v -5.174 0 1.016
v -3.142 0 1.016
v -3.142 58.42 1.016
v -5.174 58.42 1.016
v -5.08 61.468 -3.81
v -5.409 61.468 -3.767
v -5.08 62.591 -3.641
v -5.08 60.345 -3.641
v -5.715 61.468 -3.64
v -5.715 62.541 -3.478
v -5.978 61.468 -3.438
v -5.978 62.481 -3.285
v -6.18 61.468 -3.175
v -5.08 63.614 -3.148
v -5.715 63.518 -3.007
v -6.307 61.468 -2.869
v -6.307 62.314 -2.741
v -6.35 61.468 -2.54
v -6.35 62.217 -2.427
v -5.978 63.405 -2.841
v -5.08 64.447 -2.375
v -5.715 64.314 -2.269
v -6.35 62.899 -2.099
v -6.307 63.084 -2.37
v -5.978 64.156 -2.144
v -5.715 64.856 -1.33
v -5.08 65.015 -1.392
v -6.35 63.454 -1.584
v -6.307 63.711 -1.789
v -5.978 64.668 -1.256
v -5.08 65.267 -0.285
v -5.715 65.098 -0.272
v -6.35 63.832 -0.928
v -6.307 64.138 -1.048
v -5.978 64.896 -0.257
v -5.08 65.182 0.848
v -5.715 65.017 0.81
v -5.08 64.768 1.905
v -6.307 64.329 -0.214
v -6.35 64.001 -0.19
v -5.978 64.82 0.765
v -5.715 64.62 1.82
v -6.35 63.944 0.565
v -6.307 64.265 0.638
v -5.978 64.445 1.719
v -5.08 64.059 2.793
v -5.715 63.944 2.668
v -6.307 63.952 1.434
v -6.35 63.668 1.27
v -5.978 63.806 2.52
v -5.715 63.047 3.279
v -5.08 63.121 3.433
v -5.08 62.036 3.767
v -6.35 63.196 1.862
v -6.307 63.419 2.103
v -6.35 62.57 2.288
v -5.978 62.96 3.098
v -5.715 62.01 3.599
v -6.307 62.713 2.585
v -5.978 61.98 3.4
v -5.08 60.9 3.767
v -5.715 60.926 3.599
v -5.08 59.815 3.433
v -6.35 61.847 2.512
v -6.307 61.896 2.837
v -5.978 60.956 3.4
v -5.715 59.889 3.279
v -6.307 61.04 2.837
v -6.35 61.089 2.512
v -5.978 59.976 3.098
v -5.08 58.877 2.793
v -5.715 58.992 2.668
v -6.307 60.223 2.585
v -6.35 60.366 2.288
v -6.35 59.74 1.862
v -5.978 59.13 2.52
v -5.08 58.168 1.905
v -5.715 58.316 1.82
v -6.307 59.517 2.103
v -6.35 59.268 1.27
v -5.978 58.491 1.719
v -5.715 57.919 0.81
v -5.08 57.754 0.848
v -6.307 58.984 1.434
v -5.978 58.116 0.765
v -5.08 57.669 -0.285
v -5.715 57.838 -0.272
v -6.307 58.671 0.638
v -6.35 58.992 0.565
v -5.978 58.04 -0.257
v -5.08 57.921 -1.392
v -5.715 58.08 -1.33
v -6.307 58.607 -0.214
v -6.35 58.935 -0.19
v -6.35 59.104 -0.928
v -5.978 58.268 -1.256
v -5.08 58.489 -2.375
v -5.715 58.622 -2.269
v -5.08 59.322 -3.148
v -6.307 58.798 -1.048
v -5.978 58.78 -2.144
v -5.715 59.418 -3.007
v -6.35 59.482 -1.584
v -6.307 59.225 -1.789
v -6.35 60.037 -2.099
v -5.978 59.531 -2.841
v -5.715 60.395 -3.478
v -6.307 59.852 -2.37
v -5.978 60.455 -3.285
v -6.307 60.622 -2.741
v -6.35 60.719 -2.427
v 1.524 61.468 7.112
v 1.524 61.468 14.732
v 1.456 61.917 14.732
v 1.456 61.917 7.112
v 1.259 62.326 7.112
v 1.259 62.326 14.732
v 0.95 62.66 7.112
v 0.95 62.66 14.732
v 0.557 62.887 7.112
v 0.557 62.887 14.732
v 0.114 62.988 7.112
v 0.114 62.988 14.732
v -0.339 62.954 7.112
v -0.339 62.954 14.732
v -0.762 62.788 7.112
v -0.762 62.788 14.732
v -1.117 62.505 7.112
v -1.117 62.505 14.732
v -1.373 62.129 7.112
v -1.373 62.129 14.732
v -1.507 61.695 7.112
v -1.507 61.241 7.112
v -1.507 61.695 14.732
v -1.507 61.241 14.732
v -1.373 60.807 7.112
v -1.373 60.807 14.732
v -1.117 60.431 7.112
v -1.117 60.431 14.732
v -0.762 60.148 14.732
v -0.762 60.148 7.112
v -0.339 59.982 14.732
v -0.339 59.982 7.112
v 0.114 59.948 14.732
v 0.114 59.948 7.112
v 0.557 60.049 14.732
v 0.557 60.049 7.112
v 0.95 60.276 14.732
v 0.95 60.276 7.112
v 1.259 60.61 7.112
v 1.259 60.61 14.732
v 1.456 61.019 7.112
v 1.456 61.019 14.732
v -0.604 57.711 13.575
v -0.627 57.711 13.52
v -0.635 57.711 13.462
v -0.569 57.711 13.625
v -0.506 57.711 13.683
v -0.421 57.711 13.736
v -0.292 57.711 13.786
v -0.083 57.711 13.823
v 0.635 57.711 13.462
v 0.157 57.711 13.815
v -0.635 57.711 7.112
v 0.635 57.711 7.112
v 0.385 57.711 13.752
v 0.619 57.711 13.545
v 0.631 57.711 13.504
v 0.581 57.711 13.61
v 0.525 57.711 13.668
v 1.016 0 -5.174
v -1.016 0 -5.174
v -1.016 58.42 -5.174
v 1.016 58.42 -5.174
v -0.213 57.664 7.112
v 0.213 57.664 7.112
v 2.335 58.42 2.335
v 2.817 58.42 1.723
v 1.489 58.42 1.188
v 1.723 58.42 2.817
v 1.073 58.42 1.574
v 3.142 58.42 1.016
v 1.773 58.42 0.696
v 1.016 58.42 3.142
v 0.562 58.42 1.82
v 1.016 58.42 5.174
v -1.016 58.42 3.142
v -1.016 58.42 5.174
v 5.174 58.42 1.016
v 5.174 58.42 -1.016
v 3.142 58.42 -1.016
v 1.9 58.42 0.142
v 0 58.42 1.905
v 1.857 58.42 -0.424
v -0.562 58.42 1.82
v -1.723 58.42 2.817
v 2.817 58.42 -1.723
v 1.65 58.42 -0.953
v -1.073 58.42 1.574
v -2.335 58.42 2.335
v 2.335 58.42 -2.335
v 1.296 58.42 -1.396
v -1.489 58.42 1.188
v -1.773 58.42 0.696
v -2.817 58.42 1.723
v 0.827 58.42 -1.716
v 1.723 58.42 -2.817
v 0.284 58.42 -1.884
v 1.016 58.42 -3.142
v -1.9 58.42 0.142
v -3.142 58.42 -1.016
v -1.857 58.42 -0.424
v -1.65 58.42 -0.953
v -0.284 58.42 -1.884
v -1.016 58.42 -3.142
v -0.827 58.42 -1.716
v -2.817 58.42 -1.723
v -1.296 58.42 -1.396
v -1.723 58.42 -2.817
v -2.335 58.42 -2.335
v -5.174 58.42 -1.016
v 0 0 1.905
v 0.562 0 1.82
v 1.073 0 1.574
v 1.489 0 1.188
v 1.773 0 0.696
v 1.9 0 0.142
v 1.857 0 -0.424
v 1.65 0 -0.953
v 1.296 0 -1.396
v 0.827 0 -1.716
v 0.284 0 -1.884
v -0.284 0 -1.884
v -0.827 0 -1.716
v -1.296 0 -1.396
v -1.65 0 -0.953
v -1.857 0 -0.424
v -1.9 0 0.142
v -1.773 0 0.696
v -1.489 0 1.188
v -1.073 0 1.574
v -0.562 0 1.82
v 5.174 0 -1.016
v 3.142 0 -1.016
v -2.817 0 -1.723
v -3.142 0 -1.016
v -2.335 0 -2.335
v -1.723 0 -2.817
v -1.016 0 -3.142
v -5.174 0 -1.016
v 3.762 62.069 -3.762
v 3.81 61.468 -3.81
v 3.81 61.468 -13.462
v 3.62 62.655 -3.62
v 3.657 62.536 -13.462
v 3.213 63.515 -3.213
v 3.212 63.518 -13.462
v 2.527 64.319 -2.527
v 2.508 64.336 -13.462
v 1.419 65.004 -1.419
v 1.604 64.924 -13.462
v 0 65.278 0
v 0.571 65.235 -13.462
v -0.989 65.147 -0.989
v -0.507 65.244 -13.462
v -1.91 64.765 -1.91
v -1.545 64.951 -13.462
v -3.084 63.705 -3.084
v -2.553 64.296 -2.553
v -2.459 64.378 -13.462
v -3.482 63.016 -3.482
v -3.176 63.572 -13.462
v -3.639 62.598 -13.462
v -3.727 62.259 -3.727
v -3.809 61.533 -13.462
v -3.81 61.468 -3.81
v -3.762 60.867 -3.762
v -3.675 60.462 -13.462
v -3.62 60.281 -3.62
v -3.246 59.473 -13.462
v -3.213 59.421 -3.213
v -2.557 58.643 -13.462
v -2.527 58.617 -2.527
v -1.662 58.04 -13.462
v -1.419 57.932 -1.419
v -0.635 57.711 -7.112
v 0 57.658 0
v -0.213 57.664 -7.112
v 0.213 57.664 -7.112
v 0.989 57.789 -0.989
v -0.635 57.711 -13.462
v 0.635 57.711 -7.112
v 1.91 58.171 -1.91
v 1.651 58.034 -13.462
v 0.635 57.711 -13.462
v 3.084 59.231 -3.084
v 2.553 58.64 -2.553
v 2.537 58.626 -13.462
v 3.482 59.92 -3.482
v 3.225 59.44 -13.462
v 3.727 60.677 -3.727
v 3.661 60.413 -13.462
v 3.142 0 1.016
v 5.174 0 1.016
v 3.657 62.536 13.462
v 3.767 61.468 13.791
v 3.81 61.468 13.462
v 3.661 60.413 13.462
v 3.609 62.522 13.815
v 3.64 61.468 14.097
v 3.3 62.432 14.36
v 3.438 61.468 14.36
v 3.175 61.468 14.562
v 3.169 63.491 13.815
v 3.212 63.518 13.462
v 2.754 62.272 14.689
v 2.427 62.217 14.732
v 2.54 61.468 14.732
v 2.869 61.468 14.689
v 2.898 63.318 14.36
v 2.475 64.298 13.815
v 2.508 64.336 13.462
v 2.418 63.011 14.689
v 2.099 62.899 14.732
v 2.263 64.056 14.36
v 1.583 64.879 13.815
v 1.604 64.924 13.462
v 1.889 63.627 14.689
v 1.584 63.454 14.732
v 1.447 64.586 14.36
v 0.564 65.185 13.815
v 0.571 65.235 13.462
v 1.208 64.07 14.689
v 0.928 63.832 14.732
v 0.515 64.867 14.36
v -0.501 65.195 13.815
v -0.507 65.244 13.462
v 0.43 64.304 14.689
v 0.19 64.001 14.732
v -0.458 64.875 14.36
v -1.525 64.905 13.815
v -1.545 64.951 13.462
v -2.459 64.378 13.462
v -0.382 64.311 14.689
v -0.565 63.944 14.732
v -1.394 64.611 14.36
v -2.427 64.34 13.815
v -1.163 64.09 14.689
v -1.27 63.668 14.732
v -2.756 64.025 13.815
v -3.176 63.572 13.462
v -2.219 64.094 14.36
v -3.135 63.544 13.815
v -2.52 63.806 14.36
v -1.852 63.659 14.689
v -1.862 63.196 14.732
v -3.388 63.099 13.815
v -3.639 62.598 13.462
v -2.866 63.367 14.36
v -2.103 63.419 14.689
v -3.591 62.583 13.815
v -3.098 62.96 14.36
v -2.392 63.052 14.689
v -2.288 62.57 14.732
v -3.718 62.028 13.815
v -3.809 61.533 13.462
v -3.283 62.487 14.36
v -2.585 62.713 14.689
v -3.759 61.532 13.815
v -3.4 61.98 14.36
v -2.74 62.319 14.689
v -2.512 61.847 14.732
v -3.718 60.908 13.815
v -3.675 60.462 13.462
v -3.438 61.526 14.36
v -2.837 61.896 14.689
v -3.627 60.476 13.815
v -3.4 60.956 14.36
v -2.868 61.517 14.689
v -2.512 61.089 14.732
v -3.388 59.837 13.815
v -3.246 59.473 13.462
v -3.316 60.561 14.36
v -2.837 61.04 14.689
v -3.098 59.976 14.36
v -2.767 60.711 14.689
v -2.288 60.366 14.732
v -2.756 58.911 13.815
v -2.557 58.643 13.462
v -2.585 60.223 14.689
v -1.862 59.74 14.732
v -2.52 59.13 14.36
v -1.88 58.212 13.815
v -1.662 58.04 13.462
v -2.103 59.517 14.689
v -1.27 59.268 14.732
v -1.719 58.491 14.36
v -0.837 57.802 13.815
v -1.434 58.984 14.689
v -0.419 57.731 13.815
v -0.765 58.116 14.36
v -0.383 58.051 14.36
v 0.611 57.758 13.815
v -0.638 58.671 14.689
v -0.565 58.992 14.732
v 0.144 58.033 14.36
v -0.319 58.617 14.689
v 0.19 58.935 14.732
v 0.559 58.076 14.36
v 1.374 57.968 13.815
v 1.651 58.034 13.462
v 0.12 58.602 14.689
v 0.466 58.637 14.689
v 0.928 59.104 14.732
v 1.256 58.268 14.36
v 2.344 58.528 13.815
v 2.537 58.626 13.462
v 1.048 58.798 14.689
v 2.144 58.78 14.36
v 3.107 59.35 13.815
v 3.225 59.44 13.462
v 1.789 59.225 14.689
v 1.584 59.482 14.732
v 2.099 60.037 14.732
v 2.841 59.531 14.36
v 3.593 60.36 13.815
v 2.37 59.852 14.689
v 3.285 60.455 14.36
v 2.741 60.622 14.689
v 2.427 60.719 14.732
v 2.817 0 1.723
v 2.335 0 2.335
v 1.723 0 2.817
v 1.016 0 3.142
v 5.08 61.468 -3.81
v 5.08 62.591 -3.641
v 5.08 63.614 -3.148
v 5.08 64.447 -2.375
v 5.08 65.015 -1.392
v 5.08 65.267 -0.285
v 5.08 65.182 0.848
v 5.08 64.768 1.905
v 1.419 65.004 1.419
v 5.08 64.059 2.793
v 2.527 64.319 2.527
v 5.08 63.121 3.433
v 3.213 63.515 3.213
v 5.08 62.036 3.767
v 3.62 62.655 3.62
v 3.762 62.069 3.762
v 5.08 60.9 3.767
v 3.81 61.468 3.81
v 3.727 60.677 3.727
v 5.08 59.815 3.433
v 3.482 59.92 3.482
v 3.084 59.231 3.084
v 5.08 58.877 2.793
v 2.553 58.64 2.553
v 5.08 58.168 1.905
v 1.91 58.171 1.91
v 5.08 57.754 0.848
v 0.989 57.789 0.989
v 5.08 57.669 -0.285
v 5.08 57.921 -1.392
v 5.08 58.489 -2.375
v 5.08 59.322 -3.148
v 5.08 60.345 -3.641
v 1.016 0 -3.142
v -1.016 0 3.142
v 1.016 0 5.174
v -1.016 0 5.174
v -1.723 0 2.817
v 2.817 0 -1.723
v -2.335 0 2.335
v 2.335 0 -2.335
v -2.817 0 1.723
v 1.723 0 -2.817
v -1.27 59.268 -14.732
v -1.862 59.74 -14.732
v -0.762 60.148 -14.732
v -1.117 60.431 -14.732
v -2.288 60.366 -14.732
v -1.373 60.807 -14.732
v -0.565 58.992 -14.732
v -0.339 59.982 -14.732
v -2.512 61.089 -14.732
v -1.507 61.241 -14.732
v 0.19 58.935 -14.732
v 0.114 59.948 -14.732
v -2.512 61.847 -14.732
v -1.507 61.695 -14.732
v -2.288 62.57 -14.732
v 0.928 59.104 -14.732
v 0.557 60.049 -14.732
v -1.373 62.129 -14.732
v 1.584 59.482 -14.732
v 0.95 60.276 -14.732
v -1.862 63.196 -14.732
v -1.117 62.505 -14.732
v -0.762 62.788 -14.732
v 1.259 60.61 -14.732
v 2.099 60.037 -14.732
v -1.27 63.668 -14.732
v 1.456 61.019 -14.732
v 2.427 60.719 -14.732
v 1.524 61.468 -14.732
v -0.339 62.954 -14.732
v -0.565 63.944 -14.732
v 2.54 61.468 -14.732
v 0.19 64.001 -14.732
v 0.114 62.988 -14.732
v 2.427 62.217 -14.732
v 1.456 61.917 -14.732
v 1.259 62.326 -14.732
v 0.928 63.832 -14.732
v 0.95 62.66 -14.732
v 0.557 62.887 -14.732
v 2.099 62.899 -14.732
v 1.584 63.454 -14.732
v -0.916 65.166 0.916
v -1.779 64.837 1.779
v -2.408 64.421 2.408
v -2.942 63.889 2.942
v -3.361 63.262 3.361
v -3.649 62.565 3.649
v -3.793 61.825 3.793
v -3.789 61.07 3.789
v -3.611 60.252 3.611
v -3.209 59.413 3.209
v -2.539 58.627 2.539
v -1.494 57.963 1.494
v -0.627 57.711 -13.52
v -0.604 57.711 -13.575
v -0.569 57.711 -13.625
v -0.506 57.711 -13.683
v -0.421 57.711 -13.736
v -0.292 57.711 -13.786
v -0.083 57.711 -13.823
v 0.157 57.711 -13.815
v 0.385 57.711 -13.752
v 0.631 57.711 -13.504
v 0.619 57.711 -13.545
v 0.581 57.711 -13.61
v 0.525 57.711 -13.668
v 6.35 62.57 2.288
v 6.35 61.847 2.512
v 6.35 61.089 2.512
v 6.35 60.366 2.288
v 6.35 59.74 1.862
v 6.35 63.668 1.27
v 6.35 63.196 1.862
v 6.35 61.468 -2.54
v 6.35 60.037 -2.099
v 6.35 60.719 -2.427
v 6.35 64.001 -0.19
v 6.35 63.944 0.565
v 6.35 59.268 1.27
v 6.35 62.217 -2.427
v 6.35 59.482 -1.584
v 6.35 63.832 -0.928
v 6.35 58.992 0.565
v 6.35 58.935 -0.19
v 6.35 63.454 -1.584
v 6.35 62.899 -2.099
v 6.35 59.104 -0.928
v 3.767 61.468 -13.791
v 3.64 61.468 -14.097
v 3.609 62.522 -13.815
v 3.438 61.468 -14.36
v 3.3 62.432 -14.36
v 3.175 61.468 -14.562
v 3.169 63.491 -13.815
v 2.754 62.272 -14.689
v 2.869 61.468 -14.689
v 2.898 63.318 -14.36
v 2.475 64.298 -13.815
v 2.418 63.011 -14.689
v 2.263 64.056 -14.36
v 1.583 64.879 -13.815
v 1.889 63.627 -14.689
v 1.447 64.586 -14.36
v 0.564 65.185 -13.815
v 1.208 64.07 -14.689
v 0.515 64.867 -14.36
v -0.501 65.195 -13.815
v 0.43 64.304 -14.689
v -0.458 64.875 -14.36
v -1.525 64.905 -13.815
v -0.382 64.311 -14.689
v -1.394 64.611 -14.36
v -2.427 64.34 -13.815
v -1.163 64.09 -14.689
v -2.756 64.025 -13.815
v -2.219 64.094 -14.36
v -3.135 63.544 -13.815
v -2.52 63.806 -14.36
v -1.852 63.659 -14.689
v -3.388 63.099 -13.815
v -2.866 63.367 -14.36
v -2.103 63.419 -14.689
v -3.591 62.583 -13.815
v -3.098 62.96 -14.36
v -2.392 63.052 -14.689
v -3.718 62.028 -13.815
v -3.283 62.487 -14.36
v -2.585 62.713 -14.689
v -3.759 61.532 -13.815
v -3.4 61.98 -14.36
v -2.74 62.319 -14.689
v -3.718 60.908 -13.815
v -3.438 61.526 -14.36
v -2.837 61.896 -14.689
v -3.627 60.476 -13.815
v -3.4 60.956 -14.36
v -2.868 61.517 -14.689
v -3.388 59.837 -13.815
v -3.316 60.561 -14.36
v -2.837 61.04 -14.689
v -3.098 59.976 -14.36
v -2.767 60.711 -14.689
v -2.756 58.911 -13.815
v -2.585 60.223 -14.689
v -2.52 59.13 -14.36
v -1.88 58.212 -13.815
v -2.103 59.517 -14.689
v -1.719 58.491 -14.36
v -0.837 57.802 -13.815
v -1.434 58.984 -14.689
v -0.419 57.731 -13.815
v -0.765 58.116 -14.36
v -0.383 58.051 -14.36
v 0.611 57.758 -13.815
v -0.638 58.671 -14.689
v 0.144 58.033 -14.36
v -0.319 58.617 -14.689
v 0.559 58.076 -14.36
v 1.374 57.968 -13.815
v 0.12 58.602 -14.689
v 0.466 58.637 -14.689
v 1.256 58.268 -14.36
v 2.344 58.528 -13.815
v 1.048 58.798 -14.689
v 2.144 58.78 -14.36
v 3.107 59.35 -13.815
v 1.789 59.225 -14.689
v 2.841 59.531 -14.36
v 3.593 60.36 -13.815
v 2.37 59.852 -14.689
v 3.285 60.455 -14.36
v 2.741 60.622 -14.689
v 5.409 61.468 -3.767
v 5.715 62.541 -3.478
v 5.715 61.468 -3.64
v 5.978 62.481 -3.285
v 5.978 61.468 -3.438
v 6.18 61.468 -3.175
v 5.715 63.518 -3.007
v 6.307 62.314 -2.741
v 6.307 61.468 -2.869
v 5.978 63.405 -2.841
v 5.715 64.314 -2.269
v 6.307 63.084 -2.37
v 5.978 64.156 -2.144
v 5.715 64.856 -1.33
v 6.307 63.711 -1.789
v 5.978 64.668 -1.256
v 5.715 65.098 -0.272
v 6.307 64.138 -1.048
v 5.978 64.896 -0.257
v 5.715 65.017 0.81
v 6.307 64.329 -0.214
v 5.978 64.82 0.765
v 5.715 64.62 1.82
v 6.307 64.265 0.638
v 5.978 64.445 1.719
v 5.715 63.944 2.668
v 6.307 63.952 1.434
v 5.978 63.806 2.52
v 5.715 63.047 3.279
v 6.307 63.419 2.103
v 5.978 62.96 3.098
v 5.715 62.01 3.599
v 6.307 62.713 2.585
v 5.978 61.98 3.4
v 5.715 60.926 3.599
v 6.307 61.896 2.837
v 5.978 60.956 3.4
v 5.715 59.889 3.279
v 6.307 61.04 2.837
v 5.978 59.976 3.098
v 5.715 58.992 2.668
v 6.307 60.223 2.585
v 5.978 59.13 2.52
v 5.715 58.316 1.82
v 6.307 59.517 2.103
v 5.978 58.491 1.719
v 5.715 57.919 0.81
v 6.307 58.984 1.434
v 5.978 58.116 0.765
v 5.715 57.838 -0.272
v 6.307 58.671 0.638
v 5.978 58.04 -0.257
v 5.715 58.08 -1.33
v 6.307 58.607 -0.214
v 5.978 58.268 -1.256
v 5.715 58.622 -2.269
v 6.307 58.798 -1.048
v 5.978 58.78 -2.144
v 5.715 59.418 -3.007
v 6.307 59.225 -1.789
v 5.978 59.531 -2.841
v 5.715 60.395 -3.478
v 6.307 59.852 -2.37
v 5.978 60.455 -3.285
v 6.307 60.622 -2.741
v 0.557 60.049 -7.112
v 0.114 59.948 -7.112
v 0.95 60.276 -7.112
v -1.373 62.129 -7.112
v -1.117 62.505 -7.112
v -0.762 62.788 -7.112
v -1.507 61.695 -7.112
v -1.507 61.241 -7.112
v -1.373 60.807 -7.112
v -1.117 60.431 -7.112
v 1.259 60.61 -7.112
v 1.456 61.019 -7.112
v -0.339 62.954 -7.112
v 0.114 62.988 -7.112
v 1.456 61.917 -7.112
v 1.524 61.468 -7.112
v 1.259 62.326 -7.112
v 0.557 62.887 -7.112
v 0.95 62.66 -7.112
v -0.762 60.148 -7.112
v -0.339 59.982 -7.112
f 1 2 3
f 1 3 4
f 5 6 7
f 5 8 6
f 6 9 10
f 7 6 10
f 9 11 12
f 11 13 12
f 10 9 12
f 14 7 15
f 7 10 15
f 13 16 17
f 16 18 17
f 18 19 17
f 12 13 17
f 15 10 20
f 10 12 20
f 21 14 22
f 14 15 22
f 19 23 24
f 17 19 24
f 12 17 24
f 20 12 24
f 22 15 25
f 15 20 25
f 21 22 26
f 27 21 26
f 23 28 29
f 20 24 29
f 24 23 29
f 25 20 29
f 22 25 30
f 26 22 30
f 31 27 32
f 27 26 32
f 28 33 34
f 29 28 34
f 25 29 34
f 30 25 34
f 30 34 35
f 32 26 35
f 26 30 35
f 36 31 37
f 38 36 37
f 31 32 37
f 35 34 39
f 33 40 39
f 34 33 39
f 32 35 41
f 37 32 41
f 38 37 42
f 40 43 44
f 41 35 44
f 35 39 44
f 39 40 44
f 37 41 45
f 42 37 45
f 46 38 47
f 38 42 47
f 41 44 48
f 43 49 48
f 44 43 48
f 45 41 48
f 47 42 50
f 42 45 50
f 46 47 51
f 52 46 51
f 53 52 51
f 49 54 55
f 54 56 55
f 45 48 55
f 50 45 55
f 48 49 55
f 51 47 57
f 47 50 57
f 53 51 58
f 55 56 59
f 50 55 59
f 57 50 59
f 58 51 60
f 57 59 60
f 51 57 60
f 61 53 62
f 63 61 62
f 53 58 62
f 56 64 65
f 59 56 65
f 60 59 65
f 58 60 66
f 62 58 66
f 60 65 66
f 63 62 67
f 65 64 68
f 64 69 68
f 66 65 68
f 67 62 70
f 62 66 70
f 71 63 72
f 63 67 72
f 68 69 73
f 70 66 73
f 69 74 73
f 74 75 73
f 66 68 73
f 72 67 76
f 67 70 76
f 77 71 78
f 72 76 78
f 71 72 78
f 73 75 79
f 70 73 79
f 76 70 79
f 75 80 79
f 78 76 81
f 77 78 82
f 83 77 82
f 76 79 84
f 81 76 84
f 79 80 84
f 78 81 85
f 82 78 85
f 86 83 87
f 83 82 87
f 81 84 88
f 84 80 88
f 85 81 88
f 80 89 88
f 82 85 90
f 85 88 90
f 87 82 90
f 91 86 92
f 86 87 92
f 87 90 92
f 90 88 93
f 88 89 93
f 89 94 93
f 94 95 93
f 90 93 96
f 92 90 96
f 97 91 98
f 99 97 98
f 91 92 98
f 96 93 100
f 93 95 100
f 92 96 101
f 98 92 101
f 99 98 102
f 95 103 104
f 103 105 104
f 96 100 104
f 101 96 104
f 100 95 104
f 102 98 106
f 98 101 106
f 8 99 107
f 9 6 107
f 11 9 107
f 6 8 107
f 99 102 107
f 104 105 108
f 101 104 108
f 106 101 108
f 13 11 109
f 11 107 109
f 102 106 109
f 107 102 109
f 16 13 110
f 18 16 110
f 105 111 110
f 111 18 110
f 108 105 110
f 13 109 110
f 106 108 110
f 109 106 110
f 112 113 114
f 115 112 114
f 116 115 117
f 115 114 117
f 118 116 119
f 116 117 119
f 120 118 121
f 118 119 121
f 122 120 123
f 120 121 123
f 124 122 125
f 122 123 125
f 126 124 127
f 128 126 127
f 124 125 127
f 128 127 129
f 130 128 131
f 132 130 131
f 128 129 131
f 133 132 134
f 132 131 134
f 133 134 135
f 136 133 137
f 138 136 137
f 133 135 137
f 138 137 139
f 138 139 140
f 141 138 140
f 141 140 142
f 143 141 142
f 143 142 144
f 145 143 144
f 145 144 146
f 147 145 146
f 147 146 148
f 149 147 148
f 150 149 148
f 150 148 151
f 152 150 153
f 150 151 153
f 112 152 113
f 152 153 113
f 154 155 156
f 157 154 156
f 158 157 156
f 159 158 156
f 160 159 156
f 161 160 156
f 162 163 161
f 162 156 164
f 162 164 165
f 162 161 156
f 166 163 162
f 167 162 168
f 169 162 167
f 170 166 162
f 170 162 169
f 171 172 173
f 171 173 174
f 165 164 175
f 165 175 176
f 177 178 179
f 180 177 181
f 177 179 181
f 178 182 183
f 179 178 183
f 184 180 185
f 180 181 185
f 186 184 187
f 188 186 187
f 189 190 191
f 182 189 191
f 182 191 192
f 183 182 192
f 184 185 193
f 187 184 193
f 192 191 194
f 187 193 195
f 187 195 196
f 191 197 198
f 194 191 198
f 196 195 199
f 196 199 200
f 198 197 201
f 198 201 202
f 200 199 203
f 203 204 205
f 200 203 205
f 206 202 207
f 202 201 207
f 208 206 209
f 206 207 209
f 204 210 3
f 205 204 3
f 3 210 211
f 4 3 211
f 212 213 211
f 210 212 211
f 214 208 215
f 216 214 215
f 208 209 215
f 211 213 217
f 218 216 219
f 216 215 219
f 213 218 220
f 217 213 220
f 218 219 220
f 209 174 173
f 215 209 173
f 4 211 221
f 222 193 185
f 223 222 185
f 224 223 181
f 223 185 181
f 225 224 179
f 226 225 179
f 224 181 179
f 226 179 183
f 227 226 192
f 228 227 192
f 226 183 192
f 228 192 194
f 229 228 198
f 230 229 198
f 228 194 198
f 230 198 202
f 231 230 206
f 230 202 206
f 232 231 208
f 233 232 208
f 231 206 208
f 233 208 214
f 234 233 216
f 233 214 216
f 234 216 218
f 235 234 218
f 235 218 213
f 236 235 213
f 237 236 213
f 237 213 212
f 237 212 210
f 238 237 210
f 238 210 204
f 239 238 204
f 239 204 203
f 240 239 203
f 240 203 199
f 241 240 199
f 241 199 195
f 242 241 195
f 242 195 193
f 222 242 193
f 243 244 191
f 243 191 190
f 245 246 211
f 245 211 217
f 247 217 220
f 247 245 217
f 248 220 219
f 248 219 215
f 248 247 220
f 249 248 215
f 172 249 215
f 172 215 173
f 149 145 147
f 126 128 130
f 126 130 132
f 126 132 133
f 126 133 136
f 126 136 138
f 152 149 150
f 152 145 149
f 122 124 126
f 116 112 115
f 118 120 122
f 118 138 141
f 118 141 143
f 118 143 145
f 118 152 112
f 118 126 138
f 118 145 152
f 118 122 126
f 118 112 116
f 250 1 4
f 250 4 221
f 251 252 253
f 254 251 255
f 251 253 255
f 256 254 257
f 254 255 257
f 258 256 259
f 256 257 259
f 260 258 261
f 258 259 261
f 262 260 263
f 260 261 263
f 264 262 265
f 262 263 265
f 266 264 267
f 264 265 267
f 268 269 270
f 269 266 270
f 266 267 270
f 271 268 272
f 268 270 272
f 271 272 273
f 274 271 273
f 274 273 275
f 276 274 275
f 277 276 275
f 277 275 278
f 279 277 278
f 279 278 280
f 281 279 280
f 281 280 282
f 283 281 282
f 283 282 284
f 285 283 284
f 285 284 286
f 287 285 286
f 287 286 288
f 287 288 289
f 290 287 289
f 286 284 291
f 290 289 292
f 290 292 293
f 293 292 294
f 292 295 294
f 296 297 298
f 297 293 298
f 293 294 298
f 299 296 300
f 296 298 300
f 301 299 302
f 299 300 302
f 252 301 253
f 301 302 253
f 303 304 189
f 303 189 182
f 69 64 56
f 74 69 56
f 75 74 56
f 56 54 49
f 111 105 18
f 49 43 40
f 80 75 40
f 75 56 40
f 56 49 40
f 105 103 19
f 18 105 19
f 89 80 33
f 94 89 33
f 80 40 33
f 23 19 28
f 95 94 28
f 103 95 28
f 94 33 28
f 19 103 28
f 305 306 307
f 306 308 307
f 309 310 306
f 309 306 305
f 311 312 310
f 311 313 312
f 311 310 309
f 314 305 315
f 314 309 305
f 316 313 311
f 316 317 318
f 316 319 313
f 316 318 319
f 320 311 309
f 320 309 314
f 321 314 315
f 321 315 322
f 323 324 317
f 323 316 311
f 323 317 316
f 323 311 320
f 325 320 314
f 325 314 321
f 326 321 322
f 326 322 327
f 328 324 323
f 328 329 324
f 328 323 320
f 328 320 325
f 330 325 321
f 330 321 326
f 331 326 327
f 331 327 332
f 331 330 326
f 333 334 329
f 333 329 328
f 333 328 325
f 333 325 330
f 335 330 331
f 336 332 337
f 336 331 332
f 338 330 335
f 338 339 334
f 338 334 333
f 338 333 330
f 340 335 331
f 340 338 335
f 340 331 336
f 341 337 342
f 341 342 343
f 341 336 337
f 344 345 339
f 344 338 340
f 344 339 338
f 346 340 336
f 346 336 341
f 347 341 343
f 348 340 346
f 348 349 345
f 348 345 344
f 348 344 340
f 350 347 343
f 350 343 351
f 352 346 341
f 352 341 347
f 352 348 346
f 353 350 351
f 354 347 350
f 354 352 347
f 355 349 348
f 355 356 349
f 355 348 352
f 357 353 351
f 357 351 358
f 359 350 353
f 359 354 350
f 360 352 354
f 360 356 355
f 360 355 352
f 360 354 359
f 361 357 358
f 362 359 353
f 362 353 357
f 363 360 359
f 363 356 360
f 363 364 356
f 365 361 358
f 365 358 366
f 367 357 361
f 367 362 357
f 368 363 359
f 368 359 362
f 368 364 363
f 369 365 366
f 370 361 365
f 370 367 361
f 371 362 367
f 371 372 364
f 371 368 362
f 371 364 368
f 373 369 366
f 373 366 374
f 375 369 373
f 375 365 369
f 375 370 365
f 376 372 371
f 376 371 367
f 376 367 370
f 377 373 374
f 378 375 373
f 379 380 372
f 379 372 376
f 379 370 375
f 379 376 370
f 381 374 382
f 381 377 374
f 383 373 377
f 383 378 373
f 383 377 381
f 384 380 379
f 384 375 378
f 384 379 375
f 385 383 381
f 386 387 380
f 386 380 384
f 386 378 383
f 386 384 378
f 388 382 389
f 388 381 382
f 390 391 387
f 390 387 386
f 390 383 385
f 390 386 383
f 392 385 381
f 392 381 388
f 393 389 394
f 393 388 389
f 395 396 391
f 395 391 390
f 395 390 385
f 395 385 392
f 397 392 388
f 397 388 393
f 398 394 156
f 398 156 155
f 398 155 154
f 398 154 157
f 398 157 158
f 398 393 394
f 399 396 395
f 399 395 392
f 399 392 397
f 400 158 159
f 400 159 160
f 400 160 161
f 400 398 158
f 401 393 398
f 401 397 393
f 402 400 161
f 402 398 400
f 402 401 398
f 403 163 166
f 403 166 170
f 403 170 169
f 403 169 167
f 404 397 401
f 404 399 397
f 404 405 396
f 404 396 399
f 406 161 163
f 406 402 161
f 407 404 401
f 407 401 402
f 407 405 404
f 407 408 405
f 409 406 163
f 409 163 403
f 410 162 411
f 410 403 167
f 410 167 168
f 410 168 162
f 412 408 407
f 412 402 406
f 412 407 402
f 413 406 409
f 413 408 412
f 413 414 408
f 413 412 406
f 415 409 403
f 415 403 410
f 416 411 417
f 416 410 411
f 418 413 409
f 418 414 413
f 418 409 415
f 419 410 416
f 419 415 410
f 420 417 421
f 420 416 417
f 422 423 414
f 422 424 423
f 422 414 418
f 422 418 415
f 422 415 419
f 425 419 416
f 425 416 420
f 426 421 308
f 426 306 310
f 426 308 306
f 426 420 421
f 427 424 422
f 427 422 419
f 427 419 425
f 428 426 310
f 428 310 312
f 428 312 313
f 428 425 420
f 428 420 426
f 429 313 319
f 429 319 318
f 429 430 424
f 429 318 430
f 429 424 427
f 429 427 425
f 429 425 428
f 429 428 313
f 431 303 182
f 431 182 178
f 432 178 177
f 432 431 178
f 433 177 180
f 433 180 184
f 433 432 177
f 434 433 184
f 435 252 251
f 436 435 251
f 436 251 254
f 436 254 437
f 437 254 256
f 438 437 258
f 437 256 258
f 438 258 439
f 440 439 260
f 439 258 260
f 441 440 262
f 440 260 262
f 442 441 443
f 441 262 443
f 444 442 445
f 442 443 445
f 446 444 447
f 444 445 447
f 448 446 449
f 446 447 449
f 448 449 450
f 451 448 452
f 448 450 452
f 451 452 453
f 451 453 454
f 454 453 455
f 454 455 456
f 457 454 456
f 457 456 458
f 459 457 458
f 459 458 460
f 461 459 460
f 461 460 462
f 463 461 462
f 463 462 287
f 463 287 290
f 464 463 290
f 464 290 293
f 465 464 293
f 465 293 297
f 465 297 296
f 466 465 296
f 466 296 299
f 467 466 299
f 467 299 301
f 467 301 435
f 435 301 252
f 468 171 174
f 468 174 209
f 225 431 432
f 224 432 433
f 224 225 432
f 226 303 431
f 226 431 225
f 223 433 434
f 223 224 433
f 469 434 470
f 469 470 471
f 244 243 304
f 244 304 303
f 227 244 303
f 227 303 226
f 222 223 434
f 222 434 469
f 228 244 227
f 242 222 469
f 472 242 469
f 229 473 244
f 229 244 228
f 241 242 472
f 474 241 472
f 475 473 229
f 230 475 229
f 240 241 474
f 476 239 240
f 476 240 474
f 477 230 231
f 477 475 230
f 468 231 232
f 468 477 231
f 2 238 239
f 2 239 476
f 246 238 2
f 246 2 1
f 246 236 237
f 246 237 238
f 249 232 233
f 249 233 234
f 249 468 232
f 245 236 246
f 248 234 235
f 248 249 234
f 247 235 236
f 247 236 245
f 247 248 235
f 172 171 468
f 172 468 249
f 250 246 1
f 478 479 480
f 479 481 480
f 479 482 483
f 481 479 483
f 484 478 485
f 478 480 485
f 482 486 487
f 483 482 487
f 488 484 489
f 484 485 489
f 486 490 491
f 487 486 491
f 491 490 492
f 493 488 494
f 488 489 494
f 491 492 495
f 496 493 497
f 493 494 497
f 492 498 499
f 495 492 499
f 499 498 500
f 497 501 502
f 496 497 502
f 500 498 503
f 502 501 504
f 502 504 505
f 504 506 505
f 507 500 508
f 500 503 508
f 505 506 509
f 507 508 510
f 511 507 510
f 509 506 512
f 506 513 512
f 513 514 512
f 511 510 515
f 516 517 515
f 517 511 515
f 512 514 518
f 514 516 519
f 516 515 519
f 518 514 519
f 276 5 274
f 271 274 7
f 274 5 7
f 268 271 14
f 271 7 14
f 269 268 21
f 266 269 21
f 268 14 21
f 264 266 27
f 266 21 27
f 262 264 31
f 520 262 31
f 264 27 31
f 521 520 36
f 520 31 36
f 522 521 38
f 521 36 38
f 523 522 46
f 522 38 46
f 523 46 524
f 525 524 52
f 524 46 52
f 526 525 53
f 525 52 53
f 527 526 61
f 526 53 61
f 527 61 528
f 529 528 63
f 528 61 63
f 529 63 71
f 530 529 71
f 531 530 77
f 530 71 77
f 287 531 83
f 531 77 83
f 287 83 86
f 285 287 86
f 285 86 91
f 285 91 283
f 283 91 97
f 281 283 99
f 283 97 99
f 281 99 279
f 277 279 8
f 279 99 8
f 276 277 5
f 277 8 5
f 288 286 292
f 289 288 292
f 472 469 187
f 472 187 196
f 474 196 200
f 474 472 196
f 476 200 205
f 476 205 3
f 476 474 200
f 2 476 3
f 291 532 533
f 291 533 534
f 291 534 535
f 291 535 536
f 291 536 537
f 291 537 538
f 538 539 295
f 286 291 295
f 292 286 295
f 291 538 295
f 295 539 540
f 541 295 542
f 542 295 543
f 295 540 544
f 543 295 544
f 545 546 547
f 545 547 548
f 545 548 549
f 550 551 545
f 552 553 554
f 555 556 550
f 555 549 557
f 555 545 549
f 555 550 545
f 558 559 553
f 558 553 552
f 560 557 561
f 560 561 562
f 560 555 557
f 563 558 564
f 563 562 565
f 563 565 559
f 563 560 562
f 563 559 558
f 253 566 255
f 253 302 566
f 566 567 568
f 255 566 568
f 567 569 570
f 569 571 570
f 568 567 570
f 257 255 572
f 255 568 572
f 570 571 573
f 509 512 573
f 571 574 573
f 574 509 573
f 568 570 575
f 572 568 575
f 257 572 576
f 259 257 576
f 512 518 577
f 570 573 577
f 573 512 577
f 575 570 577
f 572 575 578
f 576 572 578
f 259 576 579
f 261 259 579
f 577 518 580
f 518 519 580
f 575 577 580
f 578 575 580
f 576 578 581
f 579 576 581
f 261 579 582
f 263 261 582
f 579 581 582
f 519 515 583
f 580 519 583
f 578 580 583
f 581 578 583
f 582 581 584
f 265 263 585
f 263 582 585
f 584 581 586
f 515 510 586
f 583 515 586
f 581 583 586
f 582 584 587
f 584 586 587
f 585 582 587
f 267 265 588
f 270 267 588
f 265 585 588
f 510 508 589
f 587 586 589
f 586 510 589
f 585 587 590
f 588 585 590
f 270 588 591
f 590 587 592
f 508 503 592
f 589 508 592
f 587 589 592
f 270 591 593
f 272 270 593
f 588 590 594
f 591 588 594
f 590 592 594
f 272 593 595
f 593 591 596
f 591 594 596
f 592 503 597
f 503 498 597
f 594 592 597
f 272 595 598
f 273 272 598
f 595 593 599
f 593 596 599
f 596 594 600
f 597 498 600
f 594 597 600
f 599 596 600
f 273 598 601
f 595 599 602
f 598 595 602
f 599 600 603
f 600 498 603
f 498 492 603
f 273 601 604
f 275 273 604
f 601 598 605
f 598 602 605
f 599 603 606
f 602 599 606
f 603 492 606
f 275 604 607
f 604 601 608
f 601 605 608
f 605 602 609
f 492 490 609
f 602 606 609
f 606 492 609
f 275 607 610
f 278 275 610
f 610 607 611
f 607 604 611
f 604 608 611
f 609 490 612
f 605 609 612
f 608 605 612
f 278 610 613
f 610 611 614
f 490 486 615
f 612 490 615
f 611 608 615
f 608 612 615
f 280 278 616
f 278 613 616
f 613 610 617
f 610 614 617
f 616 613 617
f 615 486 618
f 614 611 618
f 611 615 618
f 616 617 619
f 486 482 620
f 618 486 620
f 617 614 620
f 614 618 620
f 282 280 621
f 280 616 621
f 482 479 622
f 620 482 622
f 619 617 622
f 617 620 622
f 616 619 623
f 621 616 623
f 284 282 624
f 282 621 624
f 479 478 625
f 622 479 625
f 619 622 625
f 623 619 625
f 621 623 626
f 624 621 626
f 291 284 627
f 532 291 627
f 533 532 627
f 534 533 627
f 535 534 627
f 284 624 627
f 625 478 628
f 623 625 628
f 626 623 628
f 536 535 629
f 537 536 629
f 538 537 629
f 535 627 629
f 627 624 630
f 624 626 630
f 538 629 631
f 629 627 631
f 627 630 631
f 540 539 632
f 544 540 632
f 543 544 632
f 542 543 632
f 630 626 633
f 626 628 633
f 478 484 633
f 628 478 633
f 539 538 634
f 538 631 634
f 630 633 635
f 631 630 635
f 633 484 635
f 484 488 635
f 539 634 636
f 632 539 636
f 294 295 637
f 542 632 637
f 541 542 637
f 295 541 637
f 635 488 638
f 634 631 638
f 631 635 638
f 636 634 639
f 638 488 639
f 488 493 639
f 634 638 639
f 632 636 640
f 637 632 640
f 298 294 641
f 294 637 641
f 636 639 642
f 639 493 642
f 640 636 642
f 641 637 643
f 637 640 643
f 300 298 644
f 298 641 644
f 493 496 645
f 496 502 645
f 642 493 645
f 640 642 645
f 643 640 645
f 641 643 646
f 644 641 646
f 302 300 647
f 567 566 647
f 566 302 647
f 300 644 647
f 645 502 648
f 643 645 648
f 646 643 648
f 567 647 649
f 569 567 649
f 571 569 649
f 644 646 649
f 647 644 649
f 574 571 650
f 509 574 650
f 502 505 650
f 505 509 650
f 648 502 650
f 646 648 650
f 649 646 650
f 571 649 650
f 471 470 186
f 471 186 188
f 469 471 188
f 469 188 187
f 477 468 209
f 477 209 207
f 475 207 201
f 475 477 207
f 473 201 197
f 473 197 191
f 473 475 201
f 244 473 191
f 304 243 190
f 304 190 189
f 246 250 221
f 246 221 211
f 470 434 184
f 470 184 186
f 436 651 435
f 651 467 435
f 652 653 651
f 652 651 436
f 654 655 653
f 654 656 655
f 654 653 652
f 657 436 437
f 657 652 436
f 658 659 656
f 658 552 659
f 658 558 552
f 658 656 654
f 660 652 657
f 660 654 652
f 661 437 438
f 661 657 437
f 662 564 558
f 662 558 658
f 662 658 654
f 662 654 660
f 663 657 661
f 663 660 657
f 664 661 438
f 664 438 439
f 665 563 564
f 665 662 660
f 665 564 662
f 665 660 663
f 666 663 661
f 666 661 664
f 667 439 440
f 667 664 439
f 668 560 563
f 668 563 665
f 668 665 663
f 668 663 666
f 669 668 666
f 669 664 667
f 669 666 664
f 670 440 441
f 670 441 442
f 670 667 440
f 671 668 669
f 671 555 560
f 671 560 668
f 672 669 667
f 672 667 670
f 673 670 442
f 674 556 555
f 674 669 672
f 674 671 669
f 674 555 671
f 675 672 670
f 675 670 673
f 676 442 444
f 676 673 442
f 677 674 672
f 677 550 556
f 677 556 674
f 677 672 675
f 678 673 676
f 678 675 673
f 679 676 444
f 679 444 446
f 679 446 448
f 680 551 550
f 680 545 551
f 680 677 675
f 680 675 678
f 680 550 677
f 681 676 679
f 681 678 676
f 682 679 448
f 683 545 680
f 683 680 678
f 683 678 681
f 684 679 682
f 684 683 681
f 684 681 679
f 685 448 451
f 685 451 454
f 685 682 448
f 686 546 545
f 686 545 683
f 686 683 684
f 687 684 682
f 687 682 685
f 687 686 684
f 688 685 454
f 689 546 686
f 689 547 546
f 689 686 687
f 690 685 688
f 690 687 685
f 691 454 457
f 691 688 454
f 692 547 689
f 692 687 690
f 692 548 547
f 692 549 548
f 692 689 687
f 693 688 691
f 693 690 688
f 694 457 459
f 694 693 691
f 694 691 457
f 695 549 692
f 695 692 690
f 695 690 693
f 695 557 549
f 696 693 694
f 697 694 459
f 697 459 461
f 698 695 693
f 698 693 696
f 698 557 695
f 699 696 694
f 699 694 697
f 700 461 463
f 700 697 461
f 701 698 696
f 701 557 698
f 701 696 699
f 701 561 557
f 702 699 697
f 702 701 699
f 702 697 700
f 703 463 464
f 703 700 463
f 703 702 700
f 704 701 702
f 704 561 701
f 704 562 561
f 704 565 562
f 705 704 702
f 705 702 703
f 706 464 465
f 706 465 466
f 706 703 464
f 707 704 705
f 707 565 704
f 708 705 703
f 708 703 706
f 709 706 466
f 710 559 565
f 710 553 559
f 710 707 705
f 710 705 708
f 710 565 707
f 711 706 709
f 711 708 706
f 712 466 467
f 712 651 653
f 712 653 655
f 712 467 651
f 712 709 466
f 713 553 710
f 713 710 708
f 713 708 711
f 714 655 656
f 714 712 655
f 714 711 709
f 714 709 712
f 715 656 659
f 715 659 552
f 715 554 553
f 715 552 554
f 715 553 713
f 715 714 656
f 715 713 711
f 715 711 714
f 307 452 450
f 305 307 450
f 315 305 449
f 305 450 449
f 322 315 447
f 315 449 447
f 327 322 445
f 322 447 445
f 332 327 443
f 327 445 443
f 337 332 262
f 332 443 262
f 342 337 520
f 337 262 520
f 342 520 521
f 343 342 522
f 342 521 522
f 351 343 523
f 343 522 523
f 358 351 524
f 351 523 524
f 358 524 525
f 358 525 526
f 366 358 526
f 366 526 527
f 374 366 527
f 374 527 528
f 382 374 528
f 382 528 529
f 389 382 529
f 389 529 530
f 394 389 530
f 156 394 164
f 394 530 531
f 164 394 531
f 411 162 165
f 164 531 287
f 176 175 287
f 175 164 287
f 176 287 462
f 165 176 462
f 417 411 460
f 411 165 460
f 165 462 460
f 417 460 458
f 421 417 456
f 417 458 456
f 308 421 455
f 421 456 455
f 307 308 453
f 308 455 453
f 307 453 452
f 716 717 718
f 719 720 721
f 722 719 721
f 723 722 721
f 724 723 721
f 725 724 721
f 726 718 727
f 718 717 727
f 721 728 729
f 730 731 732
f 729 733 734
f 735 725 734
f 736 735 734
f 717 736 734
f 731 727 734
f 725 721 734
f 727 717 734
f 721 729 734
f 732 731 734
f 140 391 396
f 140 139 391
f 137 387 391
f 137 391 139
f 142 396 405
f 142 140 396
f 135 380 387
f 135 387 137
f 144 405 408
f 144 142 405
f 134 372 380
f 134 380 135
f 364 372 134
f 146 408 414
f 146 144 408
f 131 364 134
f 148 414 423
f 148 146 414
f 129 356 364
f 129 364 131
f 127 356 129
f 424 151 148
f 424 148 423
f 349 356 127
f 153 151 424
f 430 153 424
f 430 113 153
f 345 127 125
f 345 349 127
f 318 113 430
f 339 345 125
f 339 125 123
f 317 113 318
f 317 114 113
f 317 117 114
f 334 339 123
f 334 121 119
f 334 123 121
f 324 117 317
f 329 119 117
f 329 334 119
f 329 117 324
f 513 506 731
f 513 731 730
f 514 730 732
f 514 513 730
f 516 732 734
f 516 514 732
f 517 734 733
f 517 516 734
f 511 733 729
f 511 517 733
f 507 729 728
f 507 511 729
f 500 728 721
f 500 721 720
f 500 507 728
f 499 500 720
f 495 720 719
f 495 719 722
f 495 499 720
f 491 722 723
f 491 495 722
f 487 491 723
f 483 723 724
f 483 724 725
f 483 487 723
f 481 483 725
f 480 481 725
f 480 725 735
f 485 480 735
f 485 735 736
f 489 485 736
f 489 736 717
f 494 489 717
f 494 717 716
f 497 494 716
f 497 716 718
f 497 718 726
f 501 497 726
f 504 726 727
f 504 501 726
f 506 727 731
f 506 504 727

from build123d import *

# Parameters (mm, degrees)
BOSS_EXTRUDE2_DEPTH      = 58.42
SKETCH4_R                = 1.905
CUT_EXTRUDE1_DEPTH       = 59.876420978
BOSS_EXTRUDE3_DEPTH      = 14.732
BOSS_EXTRUDE3_DEPTH_BACK = 14.732
SKETCH5_R                = 3.81
SKETCH6_R                = 3.738220815
CUT_EXTRUDE3_DEPTH       = 12.7
BOSS_EXTRUDE4_DEPTH      = 6.35
BOSS_EXTRUDE4_DEPTH_BACK = 6.35
SKETCH7_R                = 3.81
FILLET2_R                = 1.27
FILLET3_R                = 1.27
FILLET4_R                = 1.27
SKETCH8_R                = 1.524
SKETCH8_W                = 1.27
SKETCH8_H                = 0.341676571
CUT_EXTRUDE4_DEPTH       = 7.62


with BuildPart() as part:
    # Sketch3 → Boss-Extrude2 (new body)
    with BuildSketch(Plane(origin=(0, 0, 0), x_dir=(1, 0, 0), z_dir=(0, 1, 0))):
        with BuildLine():
            Line((-1.016, 3.141806487), (-1.016, 5.173806487))
            Line((-1.016, 5.173806487), (1.016, 5.173806487))
            Line((1.016, 5.173806487), (1.016, 3.141806487))
            ThreePointArc((1.016, 3.141806487), (2.334866591, 2.334866591), (3.141806487, 1.016))
            Line((3.141806487, 1.016), (5.173806487, 1.016))
            Line((5.173806487, 1.016), (5.173806487, -1.016))
            Line((5.173806487, -1.016), (3.141806487, -1.016))
            ThreePointArc((3.141806487, -1.016), (2.334866591, -2.334866591), (1.016, -3.141806487))
            Line((1.016, -3.141806487), (1.016, -5.173806487))
            Line((1.016, -5.173806487), (-1.016, -5.173806487))
            Line((-1.016, -5.173806487), (-1.016, -3.141806487))
            ThreePointArc((-1.016, -3.141806487), (-2.334866591, -2.334866591), (-3.141806487, -1.016))
            Line((-3.141806487, -1.016), (-5.173806487, -1.016))
            Line((-5.173806487, -1.016), (-5.173806487, 1.016))
            Line((-5.173806487, 1.016), (-3.141806487, 1.016))
            ThreePointArc((-3.141806487, 1.016), (-2.334866591, 2.334866591), (-1.016, 3.141806487))
        make_face()
    extrude(amount=BOSS_EXTRUDE2_DEPTH)

    # Sketch4 → Cut-Extrude1 (cut, through all)
    with BuildSketch(Plane(origin=(0, 58.42, 0), x_dir=(1, 0, 0), z_dir=(0, 1, 0))):
        with Locations(Location((0, 0, 0), (0, 0, 270))):
            Circle(SKETCH4_R)
    extrude(amount=-CUT_EXTRUDE1_DEPTH, mode=Mode.SUBTRACT)


with BuildPart() as body_2:
    # Sketch5 → Boss-Extrude3 (new, two sides: drawn at the far end of the back side and taken through both)
    with BuildSketch(Plane.XY.offset(-BOSS_EXTRUDE3_DEPTH_BACK)):
        with Locations((0, 61.468)):
            Circle(SKETCH5_R)
    extrude(amount=BOSS_EXTRUDE3_DEPTH + BOSS_EXTRUDE3_DEPTH_BACK)


with BuildPart() as body_3:
    # Mirror1: mirrored copy
    add(body_2.part.mirror(Plane.XY))


with BuildPart() as cut_extrude3_tool:
    # Sketch6 → Cut-Extrude3 (new body)
    with BuildSketch(Plane.XY.offset(14.732)):
        with Locations((0, 61.468)):
            Circle(SKETCH6_R)
    extrude(amount=-CUT_EXTRUDE3_DEPTH)


with BuildPart() as body_2_1:
    add(body_2.part)

    # Cut-Extrude3: cut by cut_extrude3_tool
    add(cut_extrude3_tool.part, mode=Mode.SUBTRACT)


with BuildPart() as body_3_1:
    add(body_3.part)

    # Cut-Extrude3: cut by cut_extrude3_tool
    add(cut_extrude3_tool.part, mode=Mode.SUBTRACT)


with BuildPart() as body_4:
    # Mirror2: mirrored copy
    add(body_2_1.part.mirror(Plane.XY))


with BuildPart() as body_2_2:
    add(body_2_1.part)

    add(body_3_1.part)  # Boss-Extrude4 merges body 3

    add(body_4.part)  # Boss-Extrude4 merges body 4
    # Sketch7 → Boss-Extrude4 (add, two sides: drawn at the far end of the back side and taken through both)
    with BuildSketch(Plane(origin=(0, 0, 0), x_dir=(0, 0, -1), z_dir=(1, 0, 0)).offset(-BOSS_EXTRUDE4_DEPTH_BACK)):
        with Locations((0, 61.468)):
            Circle(SKETCH7_R)
    extrude(amount=BOSS_EXTRUDE4_DEPTH + BOSS_EXTRUDE4_DEPTH_BACK)

    # Fillet2
    fillet2_edges = [body_2_2.edges().sort_by_distance(p)[0] for p in [
        (-3.81, 61.468, -14.732),
    ]]
    fillet(fillet2_edges, radius=FILLET2_R)

    # Fillet3
    fillet3_edges = [body_2_2.edges().sort_by_distance(p)[0] for p in [
        (-6.35, 61.468, 3.81),
        (6.35, 61.468, 3.81),
    ]]
    fillet(fillet3_edges, radius=FILLET3_R)

    # Fillet4
    fillet4_edges = [body_2_2.edges().sort_by_distance(p)[0] for p in [
        (-3.81, 61.468, 14.732),
    ]]
    fillet(fillet4_edges, radius=FILLET4_R)

    # Sketch8 → Cut-Extrude4 (cut)
    with BuildSketch(Plane.XY.offset(14.732)):
        with Locations((0, 61.468)):
            Circle(SKETCH8_R)
        with Locations((0, 57.540451053)):
            Rectangle(SKETCH8_W, SKETCH8_H)
    cut_extrude4 = extrude(amount=-CUT_EXTRUDE4_DEPTH, mode=Mode.SUBTRACT)

    # Mirror3: Cut-Extrude4 across plane
    add(cut_extrude4.mirror(Plane.XY), mode=Mode.SUBTRACT)


solid = Compound([part.part, body_2_2.part])
